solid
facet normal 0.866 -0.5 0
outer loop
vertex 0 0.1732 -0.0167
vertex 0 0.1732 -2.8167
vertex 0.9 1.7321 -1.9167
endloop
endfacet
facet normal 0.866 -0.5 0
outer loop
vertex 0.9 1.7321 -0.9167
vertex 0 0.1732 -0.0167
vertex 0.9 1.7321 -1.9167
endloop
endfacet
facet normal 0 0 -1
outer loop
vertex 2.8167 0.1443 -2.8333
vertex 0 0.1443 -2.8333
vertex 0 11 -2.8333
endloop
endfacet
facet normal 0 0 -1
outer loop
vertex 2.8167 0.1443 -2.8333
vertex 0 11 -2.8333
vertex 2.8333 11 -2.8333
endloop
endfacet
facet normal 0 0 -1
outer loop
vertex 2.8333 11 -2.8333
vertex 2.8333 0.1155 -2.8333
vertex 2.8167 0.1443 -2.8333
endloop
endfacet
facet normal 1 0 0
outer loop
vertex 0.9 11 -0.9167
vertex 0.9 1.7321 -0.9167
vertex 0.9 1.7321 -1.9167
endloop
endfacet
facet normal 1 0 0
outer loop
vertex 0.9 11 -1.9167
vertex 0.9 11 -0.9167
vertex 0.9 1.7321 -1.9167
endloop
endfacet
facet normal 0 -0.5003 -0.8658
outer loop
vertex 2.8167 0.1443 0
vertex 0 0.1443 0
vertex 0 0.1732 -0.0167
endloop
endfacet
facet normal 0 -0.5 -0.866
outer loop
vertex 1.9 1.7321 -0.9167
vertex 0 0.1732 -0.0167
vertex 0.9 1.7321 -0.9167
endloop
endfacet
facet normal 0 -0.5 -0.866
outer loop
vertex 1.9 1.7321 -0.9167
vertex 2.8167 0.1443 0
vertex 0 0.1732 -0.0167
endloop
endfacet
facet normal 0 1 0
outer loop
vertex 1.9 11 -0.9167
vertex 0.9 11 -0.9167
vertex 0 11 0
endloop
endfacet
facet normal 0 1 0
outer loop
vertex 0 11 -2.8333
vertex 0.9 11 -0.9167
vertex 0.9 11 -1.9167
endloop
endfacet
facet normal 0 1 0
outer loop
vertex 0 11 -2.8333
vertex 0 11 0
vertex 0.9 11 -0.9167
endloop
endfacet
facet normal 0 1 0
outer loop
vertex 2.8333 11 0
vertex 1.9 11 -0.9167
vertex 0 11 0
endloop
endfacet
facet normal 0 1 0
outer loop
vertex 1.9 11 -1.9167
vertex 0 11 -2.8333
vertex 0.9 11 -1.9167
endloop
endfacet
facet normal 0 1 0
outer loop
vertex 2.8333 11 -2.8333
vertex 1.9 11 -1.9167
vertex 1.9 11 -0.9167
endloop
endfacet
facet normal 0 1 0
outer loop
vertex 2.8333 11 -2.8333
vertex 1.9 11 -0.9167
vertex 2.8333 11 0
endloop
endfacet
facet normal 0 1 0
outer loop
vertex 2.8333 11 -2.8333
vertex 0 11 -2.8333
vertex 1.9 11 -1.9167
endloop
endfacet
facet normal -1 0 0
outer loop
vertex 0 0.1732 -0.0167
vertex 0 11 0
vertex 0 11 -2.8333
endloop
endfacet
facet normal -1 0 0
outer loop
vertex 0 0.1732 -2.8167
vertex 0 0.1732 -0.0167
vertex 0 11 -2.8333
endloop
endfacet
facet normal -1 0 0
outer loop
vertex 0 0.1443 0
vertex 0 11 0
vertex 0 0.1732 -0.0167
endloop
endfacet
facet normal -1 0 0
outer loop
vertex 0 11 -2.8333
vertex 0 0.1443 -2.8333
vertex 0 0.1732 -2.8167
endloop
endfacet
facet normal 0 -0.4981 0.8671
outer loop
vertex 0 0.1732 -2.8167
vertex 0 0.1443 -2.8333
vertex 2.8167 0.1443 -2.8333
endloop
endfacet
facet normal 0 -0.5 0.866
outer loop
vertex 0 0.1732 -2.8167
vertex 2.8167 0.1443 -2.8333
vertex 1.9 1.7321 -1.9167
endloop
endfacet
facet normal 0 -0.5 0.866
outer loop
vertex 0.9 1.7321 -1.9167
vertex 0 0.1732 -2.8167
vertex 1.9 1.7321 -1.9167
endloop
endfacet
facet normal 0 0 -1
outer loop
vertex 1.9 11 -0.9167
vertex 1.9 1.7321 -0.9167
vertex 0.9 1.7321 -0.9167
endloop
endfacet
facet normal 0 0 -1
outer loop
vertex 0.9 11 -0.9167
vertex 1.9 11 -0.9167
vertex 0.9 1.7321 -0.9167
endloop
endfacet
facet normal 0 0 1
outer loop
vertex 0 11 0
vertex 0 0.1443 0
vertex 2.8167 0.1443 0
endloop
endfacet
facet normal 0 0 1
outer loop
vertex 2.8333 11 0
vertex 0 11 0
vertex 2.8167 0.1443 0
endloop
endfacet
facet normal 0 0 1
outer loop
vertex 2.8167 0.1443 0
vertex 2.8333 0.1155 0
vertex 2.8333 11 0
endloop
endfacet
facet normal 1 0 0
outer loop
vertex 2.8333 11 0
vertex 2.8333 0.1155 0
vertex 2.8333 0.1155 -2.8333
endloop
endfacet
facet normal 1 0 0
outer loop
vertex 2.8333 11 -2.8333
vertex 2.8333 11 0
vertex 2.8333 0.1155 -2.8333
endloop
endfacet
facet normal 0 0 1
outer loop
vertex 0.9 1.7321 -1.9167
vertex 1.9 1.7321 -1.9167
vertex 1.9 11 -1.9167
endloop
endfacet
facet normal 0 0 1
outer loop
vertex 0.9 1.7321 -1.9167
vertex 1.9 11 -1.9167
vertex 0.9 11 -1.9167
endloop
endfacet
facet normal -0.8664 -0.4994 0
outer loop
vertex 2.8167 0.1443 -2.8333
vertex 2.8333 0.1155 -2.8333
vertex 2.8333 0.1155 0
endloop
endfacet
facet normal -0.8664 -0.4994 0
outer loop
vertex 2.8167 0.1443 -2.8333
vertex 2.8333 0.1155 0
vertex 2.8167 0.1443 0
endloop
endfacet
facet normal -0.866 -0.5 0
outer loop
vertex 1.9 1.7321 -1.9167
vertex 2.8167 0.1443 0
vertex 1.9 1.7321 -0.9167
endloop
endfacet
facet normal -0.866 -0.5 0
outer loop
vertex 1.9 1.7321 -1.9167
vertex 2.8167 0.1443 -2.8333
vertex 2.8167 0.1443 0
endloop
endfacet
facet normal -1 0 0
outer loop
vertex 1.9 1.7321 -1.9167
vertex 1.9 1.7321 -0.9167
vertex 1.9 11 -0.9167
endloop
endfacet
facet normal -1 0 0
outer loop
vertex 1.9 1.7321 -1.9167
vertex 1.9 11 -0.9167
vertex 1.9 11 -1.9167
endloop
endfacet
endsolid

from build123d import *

# Parameters (mm, degrees)
SKETCH1_W           = 2.83333
SKETCH1_H           = 2.83333
BOSS_EXTRUDE2_DEPTH = 11
SKETCH2_W           = 1
SKETCH2_H           = 1
CUT_EXTRUDE1_DEPTH  = 11


with BuildPart() as part:
    # Sketch1 → Boss-Extrude2 (new body)
    with BuildSketch(Plane(origin=(0, 0, 0), x_dir=(1, 0, 0), z_dir=(0, 1, 0))):
        with Locations((1.416665, 1.416665)):
            Rectangle(SKETCH1_W, SKETCH1_H)
    extrude(amount=BOSS_EXTRUDE2_DEPTH)

    # Sketch2 → Cut-Extrude1 (cut)
    with BuildSketch(Plane(origin=(0, 0, 0), x_dir=(-1, 0, 0), z_dir=(0, -1, 0))):
        with Locations((-1.4, 1.416665)):
            Rectangle(SKETCH2_W, SKETCH2_H)
    extrude(amount=-CUT_EXTRUDE1_DEPTH, mode=Mode.SUBTRACT)

    # Chamfer5
    # the kernel refuses this chamfer: 1.732050808, 1 mm, written as the material it takes off along each edge
    with BuildSketch(Plane(origin=(1.9, 0, -0.916665), x_dir=(0, -0.05789386240267139, 0.9983227437537926), z_dir=(-1, 0, 0)), Plane(origin=(0.9, 0, -0.916665), x_dir=(-0.9983227437537926, -0.0578938624026714, 0), z_dir=(0, 0, -1)), Plane(origin=(0.9, 0, -1.916665), x_dir=(0, -0.05789386240267139, -0.9983227437537926), z_dir=(1, 0, 0)), Plane(origin=(1.9, 0, -1.916665), x_dir=(0.9983227437537926, -0.05789386240267139, 0), z_dir=(0, 0, 1))) as chamfer5_piece_1:
        with BuildLine():
            Line((1.03637929, 0), (-0.138331657, 1.787039577))
            Line((-0.138331657, 1.787039577), (-0.172914571, 1.785034075))
            ThreePointArc((-0.172914571, 1.785034075), (-0.086457286, 0.892517037), (-0.034582914, -0.002005502))
            Line((-0.034582914, -0.002005502), (0.002005502, -0.034582914))
            ThreePointArc((0.002005502, -0.034582914), (0.518458331, -0.004633232), (1.038384792, -0.034582914))
            Line((1.038384792, -0.034582914), (1.03637929, 0))
        make_face()
    extrude(amount=1, mode=Mode.SUBTRACT)
    with BuildSketch(Plane(origin=(1.9, 0, -1.916665), x_dir=(0.9983227437537926, -0.05789386240267139, 0), z_dir=(0, 0, 1))) as chamfer5_piece_2a_section:
        with BuildLine():
            Line((1.03637929, 0), (-0.138331657, 1.787039577))
            Line((-0.138331657, 1.787039577), (-0.172914571, 1.785034075))
            ThreePointArc((-0.172914571, 1.785034075), (-0.086457286, 0.892517037), (-0.034582914, -0.002005502))
            Line((-0.034582914, -0.002005502), (0.002005502, -0.034582914))
            ThreePointArc((0.002005502, -0.034582914), (0.518458331, -0.004633232), (1.038384792, -0.034582914))
            Line((1.038384792, -0.034582914), (1.03637929, 0))
        make_face()
    chamfer5_piece_2a = extrude(amount=5.480963971, mode=Mode.PRIVATE)
    chamfer5_piece_2a = split(chamfer5_piece_2a, bisect_by=Plane(origin=(2.220669895, 0.580899134, -0.916665), z_dir=(0, 0, 1)), keep=Keep.TOP, mode=Mode.PRIVATE)
    with BuildSketch(Plane(origin=(6.380963971, 0, -0.916665), x_dir=(0, -0.05789386240267139, 0.9983227437537926), z_dir=(-1, 0, 0))) as chamfer5_piece_2b_section:
        with BuildLine():
            Line((1.03637929, 0), (-0.138331657, 1.787039577))
            Line((-0.138331657, 1.787039577), (-0.172914571, 1.785034075))
            ThreePointArc((-0.172914571, 1.785034075), (-0.086457286, 0.892517037), (-0.034582914, -0.002005502))
            Line((-0.034582914, -0.002005502), (0.002005502, -0.034582914))
            ThreePointArc((0.002005502, -0.034582914), (0.518458331, -0.004633232), (1.038384792, -0.034582914))
            Line((1.038384792, -0.034582914), (1.03637929, 0))
        make_face()
    chamfer5_piece_2b = extrude(amount=5.480963971, mode=Mode.PRIVATE)
    chamfer5_piece_2b = split(chamfer5_piece_2b, bisect_by=Plane(origin=(1.9, 0.580899134, -0.595995105), z_dir=(1, 0, 0)), keep=Keep.TOP, mode=Mode.PRIVATE)
    chamfer5_piece_2 = chamfer5_piece_2a & chamfer5_piece_2b
    add(chamfer5_piece_2, mode=Mode.SUBTRACT)
    with BuildSketch(Plane(origin=(0.9, 0, 3.564298971), x_dir=(-0.9983227437537926, -0.0578938624026714, 0), z_dir=(0, 0, -1))) as chamfer5_piece_3a_section:
        with BuildLine():
            Line((1.03637929, 0), (-0.138331657, 1.787039577))
            Line((-0.138331657, 1.787039577), (-0.172914571, 1.785034075))
            ThreePointArc((-0.172914571, 1.785034075), (-0.086457286, 0.892517037), (-0.034582914, -0.002005502))
            Line((-0.034582914, -0.002005502), (0.002005502, -0.034582914))
            ThreePointArc((0.002005502, -0.034582914), (0.518458331, -0.004633232), (1.038384792, -0.034582914))
            Line((1.038384792, -0.034582914), (1.03637929, 0))
        make_face()
    chamfer5_piece_3a = extrude(amount=5.480963971, mode=Mode.PRIVATE)
    chamfer5_piece_3a = split(chamfer5_piece_3a, bisect_by=Plane(origin=(0.579330105, 0.580899134, -0.916665), z_dir=(0, 0, 1)), keep=Keep.TOP, mode=Mode.PRIVATE)
    with BuildSketch(Plane(origin=(1.9, 0, -0.916665), x_dir=(0, -0.05789386240267139, 0.9983227437537926), z_dir=(-1, 0, 0))) as chamfer5_piece_3b_section:
        with BuildLine():
            Line((1.03637929, 0), (-0.138331657, 1.787039577))
            Line((-0.138331657, 1.787039577), (-0.172914571, 1.785034075))
            ThreePointArc((-0.172914571, 1.785034075), (-0.086457286, 0.892517037), (-0.034582914, -0.002005502))
            Line((-0.034582914, -0.002005502), (0.002005502, -0.034582914))
            ThreePointArc((0.002005502, -0.034582914), (0.518458331, -0.004633232), (1.038384792, -0.034582914))
            Line((1.038384792, -0.034582914), (1.03637929, 0))
        make_face()
    chamfer5_piece_3b = extrude(amount=5.480963971, mode=Mode.PRIVATE)
    chamfer5_piece_3b = split(chamfer5_piece_3b, bisect_by=Plane(origin=(0.9, 0.580899134, -0.595995105), z_dir=(-1, 0, 0)), keep=Keep.TOP, mode=Mode.PRIVATE)
    chamfer5_piece_3 = chamfer5_piece_3a & chamfer5_piece_3b
    add(chamfer5_piece_3, mode=Mode.SUBTRACT)
    with BuildSketch(Plane(origin=(-3.580963971, 0, -1.916665), x_dir=(0, -0.05789386240267139, -0.9983227437537926), z_dir=(1, 0, 0))) as chamfer5_piece_4a_section:
        with BuildLine():
            Line((1.03637929, 0), (-0.138331657, 1.787039577))
            Line((-0.138331657, 1.787039577), (-0.172914571, 1.785034075))
            ThreePointArc((-0.172914571, 1.785034075), (-0.086457286, 0.892517037), (-0.034582914, -0.002005502))
            Line((-0.034582914, -0.002005502), (0.002005502, -0.034582914))
            ThreePointArc((0.002005502, -0.034582914), (0.518458331, -0.004633232), (1.038384792, -0.034582914))
            Line((1.038384792, -0.034582914), (1.03637929, 0))
        make_face()
    chamfer5_piece_4a = extrude(amount=5.480963971, mode=Mode.PRIVATE)
    chamfer5_piece_4a = split(chamfer5_piece_4a, bisect_by=Plane(origin=(0.9, 0.580899134, -2.237334895), z_dir=(-1, 0, 0)), keep=Keep.TOP, mode=Mode.PRIVATE)
    with BuildSketch(Plane(origin=(0.9, 0, -0.916665), x_dir=(-0.9983227437537926, -0.0578938624026714, 0), z_dir=(0, 0, -1))) as chamfer5_piece_4b_section:
        with BuildLine():
            Line((1.03637929, 0), (-0.138331657, 1.787039577))
            Line((-0.138331657, 1.787039577), (-0.172914571, 1.785034075))
            ThreePointArc((-0.172914571, 1.785034075), (-0.086457286, 0.892517037), (-0.034582914, -0.002005502))
            Line((-0.034582914, -0.002005502), (0.002005502, -0.034582914))
            ThreePointArc((0.002005502, -0.034582914), (0.518458331, -0.004633232), (1.038384792, -0.034582914))
            Line((1.038384792, -0.034582914), (1.03637929, 0))
        make_face()
    chamfer5_piece_4b = extrude(amount=5.480963971, mode=Mode.PRIVATE)
    chamfer5_piece_4b = split(chamfer5_piece_4b, bisect_by=Plane(origin=(0.579330105, 0.580899134, -1.916665), z_dir=(0, 0, -1)), keep=Keep.TOP, mode=Mode.PRIVATE)
    chamfer5_piece_4 = chamfer5_piece_4a & chamfer5_piece_4b
    add(chamfer5_piece_4, mode=Mode.SUBTRACT)
    with BuildSketch(Plane(origin=(1.9, 0, -6.397628971), x_dir=(0.9983227437537926, -0.05789386240267139, 0), z_dir=(0, 0, 1))) as chamfer5_piece_5a_section:
        with BuildLine():
            Line((1.03637929, 0), (-0.138331657, 1.787039577))
            Line((-0.138331657, 1.787039577), (-0.172914571, 1.785034075))
            ThreePointArc((-0.172914571, 1.785034075), (-0.086457286, 0.892517037), (-0.034582914, -0.002005502))
            Line((-0.034582914, -0.002005502), (0.002005502, -0.034582914))
            ThreePointArc((0.002005502, -0.034582914), (0.518458331, -0.004633232), (1.038384792, -0.034582914))
            Line((1.038384792, -0.034582914), (1.03637929, 0))
        make_face()
    chamfer5_piece_5a = extrude(amount=5.480963971, mode=Mode.PRIVATE)
    chamfer5_piece_5a = split(chamfer5_piece_5a, bisect_by=Plane(origin=(2.220669895, 0.580899134, -1.916665), z_dir=(0, 0, -1)), keep=Keep.TOP, mode=Mode.PRIVATE)
    with BuildSketch(Plane(origin=(0.9, 0, -1.916665), x_dir=(0, -0.05789386240267139, -0.9983227437537926), z_dir=(1, 0, 0))) as chamfer5_piece_5b_section:
        with BuildLine():
            Line((1.03637929, 0), (-0.138331657, 1.787039577))
            Line((-0.138331657, 1.787039577), (-0.172914571, 1.785034075))
            ThreePointArc((-0.172914571, 1.785034075), (-0.086457286, 0.892517037), (-0.034582914, -0.002005502))
            Line((-0.034582914, -0.002005502), (0.002005502, -0.034582914))
            ThreePointArc((0.002005502, -0.034582914), (0.518458331, -0.004633232), (1.038384792, -0.034582914))
            Line((1.038384792, -0.034582914), (1.03637929, 0))
        make_face()
    chamfer5_piece_5b = extrude(amount=5.480963971, mode=Mode.PRIVATE)
    chamfer5_piece_5b = split(chamfer5_piece_5b, bisect_by=Plane(origin=(1.9, 0.580899134, -2.237334895), z_dir=(1, 0, 0)), keep=Keep.TOP, mode=Mode.PRIVATE)
    chamfer5_piece_5 = chamfer5_piece_5a & chamfer5_piece_5b
    add(chamfer5_piece_5, mode=Mode.SUBTRACT)


solid = part.part
